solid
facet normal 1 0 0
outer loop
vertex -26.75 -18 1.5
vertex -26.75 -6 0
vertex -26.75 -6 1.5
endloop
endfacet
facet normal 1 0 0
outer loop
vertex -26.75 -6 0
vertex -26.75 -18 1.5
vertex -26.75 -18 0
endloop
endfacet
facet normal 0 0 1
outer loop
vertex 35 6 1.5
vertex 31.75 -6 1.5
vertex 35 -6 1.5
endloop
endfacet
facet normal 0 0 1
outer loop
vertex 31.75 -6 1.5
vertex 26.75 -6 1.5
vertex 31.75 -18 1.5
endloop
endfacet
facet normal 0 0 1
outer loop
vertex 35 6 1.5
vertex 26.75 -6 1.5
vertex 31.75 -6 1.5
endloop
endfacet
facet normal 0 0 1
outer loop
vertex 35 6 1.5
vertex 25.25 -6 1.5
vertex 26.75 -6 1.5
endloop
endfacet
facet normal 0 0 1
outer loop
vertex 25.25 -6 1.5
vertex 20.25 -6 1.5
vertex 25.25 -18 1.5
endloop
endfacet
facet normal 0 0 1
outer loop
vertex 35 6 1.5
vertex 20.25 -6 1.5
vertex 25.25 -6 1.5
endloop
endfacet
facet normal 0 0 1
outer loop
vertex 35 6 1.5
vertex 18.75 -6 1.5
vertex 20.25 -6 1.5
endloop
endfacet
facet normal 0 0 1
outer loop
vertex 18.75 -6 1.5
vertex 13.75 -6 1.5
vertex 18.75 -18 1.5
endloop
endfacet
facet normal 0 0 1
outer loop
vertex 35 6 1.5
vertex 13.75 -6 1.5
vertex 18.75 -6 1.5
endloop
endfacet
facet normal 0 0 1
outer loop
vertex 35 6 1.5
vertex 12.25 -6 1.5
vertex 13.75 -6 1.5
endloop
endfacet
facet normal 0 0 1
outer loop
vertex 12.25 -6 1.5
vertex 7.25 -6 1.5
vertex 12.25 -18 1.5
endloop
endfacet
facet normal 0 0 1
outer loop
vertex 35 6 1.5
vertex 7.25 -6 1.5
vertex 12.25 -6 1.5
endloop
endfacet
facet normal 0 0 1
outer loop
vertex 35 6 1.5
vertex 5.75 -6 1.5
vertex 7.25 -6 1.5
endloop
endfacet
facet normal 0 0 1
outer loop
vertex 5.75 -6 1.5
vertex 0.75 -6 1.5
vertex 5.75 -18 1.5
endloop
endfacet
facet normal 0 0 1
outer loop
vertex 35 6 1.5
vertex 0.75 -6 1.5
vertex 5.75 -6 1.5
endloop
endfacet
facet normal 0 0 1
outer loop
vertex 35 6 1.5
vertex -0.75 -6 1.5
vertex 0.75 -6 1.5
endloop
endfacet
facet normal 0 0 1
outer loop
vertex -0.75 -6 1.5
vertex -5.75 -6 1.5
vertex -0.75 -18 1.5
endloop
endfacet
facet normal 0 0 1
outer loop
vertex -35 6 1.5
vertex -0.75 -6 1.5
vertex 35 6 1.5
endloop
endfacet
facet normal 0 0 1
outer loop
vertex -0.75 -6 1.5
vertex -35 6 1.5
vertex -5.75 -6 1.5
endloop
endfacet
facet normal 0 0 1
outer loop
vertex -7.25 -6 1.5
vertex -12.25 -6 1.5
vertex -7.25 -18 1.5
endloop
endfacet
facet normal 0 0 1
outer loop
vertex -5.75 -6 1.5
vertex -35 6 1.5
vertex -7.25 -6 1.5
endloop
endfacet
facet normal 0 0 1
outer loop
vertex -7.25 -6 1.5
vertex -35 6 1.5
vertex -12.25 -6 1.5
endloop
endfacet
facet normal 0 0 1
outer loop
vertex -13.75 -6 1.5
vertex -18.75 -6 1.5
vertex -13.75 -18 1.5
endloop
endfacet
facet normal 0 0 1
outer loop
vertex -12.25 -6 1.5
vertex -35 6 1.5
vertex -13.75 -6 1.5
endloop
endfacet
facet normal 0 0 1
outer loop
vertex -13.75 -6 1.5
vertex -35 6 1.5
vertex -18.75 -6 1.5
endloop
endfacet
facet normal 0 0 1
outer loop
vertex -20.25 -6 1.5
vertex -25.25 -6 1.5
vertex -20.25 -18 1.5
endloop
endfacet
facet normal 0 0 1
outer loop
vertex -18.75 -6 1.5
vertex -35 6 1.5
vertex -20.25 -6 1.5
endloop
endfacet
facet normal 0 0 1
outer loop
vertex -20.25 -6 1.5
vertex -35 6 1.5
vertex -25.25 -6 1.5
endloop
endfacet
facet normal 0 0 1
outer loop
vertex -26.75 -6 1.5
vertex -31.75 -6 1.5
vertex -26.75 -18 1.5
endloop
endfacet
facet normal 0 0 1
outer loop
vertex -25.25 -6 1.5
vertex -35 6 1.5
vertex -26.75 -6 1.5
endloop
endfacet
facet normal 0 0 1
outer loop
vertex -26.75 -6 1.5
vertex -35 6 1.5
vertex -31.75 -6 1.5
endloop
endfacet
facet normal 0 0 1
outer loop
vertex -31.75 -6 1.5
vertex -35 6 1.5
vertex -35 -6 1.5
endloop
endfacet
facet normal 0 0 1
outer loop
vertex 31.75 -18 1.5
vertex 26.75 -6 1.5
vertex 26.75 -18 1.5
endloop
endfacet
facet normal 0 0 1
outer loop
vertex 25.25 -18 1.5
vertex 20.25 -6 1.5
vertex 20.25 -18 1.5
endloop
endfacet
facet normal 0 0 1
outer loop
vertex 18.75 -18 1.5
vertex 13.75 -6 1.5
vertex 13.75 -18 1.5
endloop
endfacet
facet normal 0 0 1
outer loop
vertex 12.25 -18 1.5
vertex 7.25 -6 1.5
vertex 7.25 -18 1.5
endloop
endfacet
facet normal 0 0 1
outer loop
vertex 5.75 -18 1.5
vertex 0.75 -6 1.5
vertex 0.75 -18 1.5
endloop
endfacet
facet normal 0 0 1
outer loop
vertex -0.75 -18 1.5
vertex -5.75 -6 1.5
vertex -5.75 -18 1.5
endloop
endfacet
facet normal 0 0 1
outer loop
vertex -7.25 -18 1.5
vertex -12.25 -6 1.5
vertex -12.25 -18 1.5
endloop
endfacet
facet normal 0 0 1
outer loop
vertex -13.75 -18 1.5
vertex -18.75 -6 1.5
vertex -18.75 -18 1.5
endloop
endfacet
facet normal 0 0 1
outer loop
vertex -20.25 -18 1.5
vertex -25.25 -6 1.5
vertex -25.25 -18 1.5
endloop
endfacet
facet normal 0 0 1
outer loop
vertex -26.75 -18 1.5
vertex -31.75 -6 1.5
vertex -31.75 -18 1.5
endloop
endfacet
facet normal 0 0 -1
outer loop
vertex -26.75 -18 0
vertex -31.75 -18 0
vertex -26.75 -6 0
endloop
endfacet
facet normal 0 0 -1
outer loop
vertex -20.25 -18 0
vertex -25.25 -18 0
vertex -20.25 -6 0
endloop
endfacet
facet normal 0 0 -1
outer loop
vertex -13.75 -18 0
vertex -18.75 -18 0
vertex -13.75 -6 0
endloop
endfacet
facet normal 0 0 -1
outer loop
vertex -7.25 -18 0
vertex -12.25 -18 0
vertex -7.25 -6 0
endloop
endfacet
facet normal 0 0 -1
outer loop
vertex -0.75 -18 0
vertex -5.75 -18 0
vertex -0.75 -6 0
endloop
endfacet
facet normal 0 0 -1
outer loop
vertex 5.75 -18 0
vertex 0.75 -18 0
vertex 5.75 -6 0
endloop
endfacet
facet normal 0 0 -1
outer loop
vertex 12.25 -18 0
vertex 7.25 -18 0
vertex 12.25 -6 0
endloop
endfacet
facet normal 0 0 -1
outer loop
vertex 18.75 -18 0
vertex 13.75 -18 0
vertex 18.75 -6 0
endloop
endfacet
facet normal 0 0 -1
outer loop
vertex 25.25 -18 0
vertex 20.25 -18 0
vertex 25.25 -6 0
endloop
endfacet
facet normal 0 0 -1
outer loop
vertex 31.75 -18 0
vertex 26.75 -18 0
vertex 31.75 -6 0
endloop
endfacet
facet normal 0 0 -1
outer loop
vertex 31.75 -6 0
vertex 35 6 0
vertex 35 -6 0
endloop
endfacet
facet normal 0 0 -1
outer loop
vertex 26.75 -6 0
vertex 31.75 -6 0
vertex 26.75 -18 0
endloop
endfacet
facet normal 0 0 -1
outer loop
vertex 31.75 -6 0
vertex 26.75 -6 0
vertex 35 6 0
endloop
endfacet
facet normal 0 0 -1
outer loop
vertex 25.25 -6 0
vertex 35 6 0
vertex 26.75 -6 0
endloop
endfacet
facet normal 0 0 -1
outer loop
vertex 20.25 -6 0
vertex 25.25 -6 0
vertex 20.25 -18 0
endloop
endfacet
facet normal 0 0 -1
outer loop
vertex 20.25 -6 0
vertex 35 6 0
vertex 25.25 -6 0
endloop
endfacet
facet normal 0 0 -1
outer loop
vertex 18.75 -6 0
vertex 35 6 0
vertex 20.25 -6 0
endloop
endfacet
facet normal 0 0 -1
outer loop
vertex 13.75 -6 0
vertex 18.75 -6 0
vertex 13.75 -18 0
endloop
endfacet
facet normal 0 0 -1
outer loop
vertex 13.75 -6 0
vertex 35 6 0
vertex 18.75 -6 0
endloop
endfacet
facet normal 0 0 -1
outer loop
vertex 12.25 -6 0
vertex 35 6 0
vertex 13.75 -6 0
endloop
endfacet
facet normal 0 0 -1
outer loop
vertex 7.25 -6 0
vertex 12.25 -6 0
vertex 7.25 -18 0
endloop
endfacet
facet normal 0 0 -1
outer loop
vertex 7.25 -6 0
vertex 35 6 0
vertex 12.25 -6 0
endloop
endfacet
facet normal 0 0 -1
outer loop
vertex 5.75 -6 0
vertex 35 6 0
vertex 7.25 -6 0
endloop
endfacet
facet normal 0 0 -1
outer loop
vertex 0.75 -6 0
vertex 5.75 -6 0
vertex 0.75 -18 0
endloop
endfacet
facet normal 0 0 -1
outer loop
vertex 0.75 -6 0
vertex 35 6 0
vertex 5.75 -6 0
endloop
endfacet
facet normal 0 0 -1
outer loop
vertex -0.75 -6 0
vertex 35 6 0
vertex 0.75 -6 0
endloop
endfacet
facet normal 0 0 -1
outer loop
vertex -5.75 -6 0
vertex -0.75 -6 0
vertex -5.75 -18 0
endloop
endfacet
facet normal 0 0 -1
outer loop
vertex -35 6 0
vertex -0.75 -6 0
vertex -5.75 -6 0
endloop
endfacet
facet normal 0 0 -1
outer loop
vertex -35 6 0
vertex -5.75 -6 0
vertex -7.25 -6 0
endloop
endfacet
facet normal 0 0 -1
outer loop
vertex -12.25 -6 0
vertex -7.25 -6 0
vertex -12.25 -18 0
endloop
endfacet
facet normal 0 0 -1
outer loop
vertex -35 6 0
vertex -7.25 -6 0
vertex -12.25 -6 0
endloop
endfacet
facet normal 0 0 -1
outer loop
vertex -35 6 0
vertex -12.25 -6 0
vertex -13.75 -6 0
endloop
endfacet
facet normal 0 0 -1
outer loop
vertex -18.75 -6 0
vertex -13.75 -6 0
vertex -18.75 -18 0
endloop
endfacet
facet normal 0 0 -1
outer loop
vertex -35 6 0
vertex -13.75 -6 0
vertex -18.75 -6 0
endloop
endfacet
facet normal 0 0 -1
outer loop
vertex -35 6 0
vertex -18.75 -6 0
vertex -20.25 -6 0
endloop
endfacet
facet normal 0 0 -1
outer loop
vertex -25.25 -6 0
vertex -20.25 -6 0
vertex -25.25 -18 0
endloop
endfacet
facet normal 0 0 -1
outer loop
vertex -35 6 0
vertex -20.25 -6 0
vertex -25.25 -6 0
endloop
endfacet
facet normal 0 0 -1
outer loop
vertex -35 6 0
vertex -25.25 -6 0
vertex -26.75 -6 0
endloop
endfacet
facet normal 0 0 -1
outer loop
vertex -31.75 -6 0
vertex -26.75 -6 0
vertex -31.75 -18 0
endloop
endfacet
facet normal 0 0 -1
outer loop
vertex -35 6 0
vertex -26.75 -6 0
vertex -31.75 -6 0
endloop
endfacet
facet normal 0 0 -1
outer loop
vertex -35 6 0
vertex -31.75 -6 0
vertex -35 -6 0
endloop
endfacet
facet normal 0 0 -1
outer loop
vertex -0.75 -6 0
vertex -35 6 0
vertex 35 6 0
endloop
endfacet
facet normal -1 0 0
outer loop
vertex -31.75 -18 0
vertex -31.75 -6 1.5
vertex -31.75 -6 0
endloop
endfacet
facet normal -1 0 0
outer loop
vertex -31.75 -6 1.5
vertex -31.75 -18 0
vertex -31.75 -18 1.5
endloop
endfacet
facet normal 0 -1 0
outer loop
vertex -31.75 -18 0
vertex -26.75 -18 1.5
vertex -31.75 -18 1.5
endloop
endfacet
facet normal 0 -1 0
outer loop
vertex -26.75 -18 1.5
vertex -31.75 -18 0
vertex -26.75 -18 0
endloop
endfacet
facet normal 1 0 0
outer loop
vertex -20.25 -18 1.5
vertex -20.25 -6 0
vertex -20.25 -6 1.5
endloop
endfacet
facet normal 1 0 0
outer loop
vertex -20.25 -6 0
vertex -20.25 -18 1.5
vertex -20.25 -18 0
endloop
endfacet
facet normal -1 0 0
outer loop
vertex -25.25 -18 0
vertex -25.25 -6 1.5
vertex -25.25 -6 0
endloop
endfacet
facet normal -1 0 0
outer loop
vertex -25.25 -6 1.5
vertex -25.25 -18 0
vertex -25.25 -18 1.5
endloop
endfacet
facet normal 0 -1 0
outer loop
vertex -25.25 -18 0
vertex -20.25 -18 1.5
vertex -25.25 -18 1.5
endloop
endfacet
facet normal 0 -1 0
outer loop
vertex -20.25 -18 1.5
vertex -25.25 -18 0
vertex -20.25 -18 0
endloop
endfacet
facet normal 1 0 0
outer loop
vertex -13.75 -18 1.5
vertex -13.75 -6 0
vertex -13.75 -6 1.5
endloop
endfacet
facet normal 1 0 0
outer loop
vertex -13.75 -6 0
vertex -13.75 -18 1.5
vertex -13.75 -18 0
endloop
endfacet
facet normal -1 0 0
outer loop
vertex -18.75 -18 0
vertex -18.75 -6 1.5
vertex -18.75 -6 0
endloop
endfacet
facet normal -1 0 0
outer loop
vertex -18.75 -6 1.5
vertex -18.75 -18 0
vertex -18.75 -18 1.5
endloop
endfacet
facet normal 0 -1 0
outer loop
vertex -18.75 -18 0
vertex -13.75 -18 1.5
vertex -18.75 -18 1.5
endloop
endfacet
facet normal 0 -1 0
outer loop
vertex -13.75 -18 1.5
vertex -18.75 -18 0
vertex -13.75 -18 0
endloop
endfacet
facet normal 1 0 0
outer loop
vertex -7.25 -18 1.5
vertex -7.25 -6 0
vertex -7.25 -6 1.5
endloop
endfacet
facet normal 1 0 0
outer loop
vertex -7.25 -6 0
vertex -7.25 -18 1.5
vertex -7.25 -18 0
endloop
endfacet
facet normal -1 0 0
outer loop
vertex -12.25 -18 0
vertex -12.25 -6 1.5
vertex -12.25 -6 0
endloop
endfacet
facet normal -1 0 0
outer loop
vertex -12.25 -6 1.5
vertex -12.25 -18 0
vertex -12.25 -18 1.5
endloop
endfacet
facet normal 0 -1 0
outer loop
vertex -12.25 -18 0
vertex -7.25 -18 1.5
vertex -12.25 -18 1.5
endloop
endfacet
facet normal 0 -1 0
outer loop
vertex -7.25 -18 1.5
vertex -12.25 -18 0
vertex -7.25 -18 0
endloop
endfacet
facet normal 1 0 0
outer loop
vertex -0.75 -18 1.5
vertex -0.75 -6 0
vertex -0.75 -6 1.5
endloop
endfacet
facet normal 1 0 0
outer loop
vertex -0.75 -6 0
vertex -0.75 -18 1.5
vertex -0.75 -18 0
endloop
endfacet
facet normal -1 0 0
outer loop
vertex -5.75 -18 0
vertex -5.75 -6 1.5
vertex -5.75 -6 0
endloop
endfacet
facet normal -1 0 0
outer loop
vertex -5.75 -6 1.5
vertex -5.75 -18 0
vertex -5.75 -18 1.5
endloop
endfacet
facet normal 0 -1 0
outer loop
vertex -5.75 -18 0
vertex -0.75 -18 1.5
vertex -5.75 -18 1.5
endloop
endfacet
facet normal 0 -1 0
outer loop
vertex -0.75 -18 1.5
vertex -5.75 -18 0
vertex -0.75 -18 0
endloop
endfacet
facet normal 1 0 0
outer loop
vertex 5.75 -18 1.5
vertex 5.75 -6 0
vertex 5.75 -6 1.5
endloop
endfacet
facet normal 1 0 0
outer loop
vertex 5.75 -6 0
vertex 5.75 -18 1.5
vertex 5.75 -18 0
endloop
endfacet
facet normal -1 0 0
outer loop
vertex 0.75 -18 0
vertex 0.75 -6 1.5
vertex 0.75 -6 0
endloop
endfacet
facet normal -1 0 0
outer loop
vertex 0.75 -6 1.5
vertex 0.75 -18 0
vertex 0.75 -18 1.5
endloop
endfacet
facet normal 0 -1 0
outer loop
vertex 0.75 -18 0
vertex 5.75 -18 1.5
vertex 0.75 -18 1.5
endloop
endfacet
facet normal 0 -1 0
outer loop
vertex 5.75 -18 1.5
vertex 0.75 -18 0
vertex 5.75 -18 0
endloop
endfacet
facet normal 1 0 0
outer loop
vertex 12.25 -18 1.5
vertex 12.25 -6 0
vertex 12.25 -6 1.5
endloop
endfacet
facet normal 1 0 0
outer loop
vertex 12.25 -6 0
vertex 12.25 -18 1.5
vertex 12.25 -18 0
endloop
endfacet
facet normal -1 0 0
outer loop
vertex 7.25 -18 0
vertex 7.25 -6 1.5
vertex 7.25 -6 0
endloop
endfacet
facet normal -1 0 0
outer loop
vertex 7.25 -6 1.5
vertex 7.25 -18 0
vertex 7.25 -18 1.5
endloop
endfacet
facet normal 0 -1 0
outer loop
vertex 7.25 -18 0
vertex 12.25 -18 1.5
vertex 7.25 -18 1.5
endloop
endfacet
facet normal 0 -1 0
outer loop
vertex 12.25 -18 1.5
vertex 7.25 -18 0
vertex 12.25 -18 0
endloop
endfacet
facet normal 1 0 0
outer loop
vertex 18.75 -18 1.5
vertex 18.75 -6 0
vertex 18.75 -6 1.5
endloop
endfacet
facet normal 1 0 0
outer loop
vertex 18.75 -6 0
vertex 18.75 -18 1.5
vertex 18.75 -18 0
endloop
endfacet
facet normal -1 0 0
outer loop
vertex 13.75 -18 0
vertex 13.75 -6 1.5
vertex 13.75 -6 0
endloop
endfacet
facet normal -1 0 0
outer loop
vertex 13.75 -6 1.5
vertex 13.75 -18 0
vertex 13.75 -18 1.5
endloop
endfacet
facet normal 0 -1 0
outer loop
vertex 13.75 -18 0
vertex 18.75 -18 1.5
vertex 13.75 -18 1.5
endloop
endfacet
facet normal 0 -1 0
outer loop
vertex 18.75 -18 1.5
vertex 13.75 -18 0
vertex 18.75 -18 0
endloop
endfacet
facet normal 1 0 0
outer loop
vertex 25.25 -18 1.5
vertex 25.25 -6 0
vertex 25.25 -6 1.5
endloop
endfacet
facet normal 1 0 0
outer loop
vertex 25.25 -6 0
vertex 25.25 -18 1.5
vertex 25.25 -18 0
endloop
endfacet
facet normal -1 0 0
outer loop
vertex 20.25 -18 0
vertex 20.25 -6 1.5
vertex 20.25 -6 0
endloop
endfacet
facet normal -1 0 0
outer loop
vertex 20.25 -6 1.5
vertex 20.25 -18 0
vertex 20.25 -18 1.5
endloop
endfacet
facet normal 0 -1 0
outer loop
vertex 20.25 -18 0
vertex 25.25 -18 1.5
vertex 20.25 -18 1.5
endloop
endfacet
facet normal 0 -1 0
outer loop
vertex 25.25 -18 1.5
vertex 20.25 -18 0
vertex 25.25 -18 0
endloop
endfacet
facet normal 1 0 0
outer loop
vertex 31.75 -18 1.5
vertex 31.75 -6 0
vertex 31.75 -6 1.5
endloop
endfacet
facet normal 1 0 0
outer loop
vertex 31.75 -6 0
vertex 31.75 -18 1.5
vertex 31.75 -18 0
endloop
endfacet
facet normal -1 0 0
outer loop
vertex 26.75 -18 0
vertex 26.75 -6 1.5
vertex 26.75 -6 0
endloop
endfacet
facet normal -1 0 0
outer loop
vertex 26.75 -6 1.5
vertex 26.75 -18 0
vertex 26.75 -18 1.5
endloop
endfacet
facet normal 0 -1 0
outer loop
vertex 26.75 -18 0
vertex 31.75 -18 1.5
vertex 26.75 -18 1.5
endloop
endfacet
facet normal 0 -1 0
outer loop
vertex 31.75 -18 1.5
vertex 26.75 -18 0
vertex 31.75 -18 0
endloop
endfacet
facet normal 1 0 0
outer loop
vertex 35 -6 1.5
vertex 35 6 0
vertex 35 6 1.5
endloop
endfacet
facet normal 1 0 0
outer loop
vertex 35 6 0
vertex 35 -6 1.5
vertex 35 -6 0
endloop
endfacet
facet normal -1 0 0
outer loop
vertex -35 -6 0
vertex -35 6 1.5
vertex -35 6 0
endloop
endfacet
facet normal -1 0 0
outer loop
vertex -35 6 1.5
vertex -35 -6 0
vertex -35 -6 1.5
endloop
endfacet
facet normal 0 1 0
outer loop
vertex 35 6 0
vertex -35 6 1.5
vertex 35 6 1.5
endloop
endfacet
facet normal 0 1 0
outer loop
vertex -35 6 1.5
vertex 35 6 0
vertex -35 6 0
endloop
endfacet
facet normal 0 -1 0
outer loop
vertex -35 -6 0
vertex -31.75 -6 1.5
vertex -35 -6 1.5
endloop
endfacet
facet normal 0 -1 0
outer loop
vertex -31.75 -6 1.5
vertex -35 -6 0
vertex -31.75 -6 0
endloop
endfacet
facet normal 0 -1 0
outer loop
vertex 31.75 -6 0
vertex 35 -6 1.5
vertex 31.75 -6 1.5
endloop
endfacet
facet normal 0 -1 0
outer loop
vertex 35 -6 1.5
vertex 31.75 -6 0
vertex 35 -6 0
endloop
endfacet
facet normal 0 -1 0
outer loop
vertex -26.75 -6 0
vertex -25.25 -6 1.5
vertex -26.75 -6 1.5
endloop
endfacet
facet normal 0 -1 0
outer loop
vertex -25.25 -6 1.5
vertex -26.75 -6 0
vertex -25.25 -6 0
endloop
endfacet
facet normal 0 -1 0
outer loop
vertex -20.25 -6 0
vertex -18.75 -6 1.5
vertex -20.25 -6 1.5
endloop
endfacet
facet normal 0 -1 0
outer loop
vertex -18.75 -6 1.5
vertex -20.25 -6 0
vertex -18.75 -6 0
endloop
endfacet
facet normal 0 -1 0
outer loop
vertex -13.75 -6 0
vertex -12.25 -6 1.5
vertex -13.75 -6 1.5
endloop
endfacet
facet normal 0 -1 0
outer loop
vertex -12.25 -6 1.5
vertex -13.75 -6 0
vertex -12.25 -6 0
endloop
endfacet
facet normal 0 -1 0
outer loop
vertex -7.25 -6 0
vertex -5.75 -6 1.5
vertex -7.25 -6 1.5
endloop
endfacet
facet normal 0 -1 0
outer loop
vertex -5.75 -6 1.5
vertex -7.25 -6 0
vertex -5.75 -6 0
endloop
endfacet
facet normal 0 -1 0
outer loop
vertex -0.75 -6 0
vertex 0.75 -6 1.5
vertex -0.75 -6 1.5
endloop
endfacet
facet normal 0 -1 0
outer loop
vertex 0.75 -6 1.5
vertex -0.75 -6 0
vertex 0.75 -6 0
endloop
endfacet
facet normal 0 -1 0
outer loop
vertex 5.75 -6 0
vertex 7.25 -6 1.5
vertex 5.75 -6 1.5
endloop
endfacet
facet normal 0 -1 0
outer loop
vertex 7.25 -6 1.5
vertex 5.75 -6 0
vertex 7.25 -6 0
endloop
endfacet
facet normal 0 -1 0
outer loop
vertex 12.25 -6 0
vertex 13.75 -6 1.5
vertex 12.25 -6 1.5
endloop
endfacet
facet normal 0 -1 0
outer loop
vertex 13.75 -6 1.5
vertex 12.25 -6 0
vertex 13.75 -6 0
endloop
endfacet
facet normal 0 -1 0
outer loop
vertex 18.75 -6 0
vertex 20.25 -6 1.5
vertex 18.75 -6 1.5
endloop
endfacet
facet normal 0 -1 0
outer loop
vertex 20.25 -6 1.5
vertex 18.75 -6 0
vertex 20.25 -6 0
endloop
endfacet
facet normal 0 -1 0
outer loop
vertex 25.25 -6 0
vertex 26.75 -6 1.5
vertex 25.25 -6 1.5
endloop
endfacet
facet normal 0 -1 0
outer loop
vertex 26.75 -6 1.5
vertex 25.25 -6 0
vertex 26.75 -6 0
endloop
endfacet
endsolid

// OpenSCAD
// 10-well agarose gel casting comb
// Print orientation: flat on bed, teeth pointing down (-Y)

plate_t     = 1.5;   // plate thickness (Z)
spine_l     = 70;    // spine length (X)
spine_w     = 12;    // spine width (Y)
tooth_w     = 5.0;   // tooth width (X)
tooth_l     = 12;    // tooth length (Y)
tooth_count = 10;    // number of teeth
gap         = 1.5;   // gap between teeth (X)

pitch = tooth_w + gap;
x0    = -(tooth_count - 1) * pitch / 2;

union() {
    // spine
    translate([-spine_l / 2, -spine_w / 2, 0])
        cube([spine_l, spine_w, plate_t]);

    // teeth
    for (i = [0 : tooth_count - 1])
        translate([x0 + i * pitch - tooth_w / 2, -spine_w / 2 - tooth_l, 0])
            cube([tooth_w, tooth_l + plate_t, plate_t]);
}
